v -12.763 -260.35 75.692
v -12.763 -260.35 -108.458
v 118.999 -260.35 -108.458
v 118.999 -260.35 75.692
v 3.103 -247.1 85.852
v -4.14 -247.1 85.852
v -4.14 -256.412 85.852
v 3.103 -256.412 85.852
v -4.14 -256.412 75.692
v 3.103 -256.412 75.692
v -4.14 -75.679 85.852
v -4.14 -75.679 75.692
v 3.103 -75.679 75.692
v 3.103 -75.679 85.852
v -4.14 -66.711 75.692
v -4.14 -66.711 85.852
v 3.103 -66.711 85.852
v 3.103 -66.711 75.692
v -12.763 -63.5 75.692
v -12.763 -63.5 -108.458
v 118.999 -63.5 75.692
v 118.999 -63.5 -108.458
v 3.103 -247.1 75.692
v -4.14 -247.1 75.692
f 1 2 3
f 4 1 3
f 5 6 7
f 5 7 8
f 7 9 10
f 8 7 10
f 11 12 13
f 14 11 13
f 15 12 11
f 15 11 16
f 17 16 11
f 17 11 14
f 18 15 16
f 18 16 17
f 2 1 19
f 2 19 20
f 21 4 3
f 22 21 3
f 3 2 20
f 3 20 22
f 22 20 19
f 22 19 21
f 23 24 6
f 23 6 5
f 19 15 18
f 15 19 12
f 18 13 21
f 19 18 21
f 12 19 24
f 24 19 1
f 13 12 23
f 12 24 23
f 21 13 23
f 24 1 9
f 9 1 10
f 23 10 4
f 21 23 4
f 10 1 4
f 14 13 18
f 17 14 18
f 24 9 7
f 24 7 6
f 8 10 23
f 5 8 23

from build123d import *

# Parameters (mm, degrees)
SKETCH1_W           = 131.7625
SKETCH1_H           = 184.15
BOSS_EXTRUDE1_DEPTH = 196.85
SKETCH2_W           = 7.243123939
SKETCH2_H           = 8.967677257
SKETCH2_H_2         = 9.31258792
BOSS_EXTRUDE2_DEPTH = 10.16


with BuildPart() as part:
    # Sketch1 → Boss-Extrude1 (new body)
    with BuildSketch(Plane(origin=(0, 0, 0), x_dir=(1, 0, 0), z_dir=(0, 1, 0))):
        with Locations((-65.88125, -92.075)):
            Rectangle(SKETCH1_W, SKETCH1_H)
    extrude(amount=BOSS_EXTRUDE1_DEPTH)


with BuildPart() as part_1:
    # Body-Move/Copy1: moved
    add(part.part.moved(Location((118.999, -260.35, -108.458))))

    # Sketch2 → Boss-Extrude2 (add)
    with BuildSketch(Plane.XY.offset(75.692)):
        with Locations((-0.518268716, -71.195276502)):
            Rectangle(SKETCH2_W, SKETCH2_H)
        with Locations((-0.518268716, -251.756008966)):
            Rectangle(SKETCH2_W, SKETCH2_H_2)
    extrude(amount=BOSS_EXTRUDE2_DEPTH)


solid = part_1.part
